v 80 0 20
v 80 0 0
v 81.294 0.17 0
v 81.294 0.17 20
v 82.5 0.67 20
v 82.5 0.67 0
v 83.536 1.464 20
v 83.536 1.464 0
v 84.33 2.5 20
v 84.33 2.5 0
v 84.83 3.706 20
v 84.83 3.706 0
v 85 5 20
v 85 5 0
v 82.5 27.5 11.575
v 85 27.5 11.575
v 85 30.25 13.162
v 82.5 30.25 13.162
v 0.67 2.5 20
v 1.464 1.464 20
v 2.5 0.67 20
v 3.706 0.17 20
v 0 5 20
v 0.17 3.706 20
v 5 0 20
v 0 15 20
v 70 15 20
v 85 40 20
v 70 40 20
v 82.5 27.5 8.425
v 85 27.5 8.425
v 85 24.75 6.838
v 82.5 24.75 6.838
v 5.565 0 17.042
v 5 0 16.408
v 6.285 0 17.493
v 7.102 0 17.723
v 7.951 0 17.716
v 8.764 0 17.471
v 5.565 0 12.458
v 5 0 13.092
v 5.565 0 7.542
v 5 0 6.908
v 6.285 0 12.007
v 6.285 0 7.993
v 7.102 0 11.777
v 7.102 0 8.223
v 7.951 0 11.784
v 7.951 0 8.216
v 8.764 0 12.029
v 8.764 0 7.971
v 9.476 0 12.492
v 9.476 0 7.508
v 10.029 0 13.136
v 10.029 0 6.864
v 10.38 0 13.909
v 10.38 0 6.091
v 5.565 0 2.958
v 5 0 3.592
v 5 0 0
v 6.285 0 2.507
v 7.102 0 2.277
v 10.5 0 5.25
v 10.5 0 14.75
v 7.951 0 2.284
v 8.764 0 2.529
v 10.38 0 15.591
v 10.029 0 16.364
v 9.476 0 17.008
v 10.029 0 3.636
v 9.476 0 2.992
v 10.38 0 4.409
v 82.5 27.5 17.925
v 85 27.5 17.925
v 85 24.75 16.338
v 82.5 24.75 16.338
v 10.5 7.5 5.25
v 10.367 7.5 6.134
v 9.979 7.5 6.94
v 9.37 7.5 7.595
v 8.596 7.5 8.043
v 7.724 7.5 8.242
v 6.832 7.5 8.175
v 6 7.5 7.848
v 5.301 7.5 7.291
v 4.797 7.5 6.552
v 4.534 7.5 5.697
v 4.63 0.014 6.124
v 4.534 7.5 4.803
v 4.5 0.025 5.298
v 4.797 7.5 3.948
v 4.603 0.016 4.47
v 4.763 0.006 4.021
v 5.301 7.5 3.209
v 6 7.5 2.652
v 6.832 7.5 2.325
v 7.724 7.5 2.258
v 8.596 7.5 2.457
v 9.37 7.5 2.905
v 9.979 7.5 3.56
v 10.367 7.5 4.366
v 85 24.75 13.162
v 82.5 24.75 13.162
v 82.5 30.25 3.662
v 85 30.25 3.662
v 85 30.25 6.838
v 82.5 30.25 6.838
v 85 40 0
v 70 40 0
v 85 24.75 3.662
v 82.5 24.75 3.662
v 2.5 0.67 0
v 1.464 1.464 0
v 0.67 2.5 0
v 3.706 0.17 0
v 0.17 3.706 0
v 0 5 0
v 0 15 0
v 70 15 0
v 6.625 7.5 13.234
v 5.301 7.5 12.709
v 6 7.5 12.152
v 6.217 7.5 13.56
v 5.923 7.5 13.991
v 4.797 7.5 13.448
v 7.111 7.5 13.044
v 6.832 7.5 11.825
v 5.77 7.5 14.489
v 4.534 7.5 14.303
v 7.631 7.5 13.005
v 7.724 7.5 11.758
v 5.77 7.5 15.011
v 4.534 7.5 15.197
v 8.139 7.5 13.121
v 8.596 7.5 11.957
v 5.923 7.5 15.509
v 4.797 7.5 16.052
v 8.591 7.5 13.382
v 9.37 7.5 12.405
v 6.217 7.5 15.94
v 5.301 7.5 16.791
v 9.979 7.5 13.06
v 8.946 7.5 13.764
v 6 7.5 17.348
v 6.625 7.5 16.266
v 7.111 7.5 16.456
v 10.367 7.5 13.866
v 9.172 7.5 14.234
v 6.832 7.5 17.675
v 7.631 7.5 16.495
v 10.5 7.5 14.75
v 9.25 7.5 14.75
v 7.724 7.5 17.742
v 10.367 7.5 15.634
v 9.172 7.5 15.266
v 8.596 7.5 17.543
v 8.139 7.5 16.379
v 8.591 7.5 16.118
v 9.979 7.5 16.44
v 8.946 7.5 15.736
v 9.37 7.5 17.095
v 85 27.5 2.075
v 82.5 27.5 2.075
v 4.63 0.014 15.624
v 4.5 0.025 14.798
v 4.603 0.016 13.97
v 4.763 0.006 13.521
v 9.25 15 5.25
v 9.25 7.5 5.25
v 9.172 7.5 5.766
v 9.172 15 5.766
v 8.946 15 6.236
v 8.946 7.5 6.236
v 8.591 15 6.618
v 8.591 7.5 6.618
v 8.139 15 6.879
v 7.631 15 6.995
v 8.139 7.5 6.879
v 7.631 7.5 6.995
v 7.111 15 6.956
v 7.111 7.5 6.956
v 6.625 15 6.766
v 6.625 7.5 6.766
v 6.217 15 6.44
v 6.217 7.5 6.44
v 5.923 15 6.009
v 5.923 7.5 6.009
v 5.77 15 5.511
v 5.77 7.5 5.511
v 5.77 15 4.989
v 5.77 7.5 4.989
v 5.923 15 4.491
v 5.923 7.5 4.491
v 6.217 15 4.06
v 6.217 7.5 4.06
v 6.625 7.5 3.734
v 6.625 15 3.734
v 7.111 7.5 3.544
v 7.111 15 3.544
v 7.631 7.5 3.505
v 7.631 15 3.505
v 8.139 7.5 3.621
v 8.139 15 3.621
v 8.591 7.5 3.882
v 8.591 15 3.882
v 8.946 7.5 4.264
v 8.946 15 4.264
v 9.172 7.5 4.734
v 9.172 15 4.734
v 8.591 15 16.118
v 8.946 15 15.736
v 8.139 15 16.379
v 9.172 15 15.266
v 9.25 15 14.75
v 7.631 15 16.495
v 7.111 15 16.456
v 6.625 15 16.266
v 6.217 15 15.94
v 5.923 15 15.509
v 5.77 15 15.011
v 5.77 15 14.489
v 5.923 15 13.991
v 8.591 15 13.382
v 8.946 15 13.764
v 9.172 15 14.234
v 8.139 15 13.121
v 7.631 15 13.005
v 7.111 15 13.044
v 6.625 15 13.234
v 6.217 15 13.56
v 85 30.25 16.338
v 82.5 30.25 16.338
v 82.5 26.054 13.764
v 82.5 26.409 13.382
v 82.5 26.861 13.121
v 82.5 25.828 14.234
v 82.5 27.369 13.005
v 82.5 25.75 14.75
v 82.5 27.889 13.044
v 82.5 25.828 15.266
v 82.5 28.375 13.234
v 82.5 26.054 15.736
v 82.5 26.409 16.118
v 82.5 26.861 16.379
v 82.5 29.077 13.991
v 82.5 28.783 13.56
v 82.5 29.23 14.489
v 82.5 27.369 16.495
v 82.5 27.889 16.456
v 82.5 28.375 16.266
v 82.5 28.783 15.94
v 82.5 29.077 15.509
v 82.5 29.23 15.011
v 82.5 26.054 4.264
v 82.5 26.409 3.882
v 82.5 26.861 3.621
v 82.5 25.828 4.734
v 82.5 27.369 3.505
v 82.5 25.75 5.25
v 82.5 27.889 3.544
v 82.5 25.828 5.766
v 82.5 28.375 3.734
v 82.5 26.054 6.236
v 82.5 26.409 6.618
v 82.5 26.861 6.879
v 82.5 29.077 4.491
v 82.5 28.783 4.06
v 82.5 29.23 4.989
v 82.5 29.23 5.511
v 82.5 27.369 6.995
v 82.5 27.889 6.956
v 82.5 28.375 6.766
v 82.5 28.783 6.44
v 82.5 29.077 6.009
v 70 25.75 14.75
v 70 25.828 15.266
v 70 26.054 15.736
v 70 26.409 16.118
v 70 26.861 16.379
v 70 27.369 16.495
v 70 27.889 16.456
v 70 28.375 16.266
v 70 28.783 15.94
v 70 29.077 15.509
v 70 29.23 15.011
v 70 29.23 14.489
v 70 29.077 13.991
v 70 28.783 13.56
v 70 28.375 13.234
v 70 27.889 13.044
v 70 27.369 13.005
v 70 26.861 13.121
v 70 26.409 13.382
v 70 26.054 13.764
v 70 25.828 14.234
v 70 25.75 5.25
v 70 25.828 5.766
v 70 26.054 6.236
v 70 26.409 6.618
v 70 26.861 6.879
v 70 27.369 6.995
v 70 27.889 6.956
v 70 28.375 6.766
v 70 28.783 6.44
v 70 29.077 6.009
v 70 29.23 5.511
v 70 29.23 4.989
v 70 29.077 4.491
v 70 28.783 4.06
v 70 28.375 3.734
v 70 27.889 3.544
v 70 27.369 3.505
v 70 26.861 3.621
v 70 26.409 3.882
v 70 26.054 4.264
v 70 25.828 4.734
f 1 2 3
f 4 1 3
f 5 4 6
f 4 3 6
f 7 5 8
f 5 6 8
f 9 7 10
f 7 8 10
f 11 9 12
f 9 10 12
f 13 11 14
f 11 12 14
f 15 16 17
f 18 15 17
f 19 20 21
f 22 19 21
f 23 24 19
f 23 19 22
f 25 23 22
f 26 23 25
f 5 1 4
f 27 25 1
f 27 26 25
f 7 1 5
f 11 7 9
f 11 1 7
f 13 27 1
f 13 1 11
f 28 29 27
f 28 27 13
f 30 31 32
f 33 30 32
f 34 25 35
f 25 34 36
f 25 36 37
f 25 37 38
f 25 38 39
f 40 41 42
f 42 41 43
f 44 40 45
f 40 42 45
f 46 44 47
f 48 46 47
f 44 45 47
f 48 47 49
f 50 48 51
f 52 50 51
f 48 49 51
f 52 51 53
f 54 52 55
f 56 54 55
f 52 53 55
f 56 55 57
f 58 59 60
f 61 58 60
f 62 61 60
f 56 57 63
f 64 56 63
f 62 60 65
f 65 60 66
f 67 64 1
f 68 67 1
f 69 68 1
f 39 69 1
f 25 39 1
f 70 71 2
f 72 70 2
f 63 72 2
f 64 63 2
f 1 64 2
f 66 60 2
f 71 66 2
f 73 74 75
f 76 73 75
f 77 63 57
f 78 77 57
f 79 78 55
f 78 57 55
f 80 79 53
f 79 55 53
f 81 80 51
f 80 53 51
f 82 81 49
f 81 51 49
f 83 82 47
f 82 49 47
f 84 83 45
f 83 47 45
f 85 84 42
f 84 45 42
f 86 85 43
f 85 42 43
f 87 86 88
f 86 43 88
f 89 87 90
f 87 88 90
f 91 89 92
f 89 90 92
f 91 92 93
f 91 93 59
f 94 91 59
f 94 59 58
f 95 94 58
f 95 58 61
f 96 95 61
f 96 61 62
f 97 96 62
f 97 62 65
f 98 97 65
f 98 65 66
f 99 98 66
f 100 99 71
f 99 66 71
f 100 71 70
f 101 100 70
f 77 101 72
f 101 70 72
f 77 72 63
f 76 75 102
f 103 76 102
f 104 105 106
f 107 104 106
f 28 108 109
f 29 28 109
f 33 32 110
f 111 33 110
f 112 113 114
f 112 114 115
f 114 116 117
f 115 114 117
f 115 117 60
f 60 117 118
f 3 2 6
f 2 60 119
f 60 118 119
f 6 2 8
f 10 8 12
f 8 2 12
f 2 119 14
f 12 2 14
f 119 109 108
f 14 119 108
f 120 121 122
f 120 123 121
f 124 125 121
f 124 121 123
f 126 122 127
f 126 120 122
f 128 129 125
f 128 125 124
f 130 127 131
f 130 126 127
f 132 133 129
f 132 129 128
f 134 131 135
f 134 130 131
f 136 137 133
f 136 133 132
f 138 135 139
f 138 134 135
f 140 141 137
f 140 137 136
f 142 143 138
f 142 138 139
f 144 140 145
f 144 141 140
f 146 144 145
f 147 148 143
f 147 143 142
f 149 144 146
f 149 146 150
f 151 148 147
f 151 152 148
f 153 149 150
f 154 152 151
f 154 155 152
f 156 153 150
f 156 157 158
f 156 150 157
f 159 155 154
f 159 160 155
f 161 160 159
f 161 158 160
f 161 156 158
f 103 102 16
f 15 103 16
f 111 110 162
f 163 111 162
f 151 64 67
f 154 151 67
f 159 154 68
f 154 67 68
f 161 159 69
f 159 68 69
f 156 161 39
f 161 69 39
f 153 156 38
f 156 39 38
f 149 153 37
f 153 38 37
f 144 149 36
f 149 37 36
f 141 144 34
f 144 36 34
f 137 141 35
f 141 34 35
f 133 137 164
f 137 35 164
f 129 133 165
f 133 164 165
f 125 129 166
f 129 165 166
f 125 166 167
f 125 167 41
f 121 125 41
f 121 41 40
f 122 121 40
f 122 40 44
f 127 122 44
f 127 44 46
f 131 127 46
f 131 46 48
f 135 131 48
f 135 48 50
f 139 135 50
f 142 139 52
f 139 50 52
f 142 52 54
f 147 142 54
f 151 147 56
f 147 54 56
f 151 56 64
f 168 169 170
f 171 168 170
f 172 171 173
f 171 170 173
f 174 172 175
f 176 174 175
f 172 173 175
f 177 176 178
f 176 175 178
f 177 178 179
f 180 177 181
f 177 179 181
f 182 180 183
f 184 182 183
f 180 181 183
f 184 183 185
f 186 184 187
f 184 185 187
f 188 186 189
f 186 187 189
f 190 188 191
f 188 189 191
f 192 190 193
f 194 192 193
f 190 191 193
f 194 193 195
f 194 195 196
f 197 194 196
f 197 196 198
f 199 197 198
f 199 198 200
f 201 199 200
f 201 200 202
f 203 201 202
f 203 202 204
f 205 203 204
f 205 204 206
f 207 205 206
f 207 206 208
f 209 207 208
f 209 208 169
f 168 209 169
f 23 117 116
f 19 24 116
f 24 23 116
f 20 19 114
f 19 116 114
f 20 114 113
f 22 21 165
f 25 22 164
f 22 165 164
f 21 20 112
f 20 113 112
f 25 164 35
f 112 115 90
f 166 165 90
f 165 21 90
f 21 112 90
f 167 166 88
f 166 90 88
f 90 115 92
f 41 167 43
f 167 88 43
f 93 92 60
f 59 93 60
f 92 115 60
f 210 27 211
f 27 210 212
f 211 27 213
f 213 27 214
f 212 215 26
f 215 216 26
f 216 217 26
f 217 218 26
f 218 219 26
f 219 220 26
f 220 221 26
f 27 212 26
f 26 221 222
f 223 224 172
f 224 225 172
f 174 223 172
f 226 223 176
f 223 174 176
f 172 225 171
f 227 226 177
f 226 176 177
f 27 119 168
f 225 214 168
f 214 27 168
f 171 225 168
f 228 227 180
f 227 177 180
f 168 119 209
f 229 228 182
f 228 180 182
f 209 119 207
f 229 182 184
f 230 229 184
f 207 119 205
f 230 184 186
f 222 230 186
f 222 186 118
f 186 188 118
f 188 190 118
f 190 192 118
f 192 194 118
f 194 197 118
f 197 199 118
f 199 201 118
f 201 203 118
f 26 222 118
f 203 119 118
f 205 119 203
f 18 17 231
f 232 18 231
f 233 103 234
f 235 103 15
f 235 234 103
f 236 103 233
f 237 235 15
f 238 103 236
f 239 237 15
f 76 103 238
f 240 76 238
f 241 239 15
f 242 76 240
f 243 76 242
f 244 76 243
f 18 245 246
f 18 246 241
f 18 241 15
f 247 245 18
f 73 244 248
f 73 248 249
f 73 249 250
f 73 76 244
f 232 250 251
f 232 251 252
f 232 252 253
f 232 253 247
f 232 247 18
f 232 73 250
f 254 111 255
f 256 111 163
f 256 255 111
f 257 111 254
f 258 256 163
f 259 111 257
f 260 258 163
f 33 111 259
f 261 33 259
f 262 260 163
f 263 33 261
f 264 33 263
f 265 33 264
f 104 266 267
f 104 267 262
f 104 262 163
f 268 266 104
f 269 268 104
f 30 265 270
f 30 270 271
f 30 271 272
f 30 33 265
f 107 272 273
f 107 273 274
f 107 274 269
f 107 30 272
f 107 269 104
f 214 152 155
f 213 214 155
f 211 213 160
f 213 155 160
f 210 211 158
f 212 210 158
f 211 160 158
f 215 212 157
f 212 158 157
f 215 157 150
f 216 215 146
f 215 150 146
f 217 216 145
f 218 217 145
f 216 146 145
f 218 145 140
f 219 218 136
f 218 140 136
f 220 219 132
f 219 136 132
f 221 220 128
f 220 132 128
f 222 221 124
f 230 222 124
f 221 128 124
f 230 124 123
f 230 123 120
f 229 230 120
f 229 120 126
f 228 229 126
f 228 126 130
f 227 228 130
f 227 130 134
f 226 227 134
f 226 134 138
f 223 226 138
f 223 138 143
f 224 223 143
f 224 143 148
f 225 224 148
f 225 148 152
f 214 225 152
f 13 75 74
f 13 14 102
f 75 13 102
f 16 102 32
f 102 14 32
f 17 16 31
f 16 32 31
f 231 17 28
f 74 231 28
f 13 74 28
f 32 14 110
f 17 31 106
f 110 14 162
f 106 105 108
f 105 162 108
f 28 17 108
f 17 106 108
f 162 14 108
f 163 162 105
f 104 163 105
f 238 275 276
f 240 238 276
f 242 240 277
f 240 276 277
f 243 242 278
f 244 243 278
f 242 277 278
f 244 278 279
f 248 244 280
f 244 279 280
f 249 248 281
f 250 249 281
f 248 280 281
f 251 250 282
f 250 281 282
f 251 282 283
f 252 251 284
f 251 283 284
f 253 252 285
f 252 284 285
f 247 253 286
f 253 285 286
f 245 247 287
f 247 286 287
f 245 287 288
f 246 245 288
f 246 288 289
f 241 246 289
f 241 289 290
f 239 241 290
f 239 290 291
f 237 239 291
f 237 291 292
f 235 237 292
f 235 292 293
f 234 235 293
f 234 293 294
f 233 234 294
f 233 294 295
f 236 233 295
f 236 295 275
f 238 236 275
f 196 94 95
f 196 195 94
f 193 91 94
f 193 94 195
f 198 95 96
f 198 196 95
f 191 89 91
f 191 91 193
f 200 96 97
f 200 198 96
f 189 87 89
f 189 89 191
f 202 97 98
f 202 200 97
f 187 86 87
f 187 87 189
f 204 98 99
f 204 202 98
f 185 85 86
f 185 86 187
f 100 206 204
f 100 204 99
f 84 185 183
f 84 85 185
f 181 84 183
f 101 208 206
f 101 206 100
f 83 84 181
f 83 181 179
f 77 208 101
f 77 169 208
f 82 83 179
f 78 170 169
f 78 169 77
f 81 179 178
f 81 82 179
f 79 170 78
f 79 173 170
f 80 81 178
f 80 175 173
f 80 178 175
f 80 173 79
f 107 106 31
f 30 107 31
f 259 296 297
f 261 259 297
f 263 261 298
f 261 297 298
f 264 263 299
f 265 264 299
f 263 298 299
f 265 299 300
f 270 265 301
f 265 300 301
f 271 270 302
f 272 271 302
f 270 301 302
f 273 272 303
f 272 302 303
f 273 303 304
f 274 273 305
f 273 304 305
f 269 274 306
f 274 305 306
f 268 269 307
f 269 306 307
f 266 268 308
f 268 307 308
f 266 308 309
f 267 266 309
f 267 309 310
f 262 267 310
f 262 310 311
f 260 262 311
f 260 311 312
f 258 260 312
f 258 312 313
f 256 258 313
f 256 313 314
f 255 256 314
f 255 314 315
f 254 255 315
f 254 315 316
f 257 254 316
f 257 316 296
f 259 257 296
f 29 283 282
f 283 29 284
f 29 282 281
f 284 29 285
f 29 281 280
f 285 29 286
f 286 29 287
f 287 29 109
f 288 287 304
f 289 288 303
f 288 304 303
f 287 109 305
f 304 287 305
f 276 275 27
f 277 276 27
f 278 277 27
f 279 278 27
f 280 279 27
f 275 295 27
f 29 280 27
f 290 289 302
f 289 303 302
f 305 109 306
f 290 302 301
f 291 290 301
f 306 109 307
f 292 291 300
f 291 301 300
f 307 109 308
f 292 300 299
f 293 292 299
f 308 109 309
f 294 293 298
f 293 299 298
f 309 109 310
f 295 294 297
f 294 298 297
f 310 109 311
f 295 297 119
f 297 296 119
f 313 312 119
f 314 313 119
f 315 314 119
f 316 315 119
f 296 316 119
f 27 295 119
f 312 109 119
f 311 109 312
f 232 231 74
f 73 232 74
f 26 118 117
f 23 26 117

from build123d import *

# Parameters (mm, degrees)
F1_DEPTH    = 20
F2_R        = 1.75
F3_DEPTH    = 40.001
F4_R        = 3
F5_DEPTH    = 7.5
F6_R        = 1.75
F7_DEPTH    = 15.001
F8_T1_DEPTH = 45
F10_DEPTH   = 2.5


# Not quite as in the source:
# - a fillet or chamfer that OpenCascade refuses, or shapes differently, is made with other operations: its cross-section is extruded or revolved along the edge and cut away or added


with BuildPart() as f1:
    # F0 (on Top) → F1 (new body)
    with BuildSketch(Plane.XY):
        Polygon((0, 15), (0, 0), (85, 0), (85, 40), (70, 40), (70, 15), align=None)
    extrude(amount=F1_DEPTH)

    # F2 (on face) → F3 (cut, through all)
    with BuildSketch(Plane.XZ):
        with Locations((7.5, 14.75)):
            Circle(F2_R)
        with Locations((7.5, 5.25)):
            Circle(F2_R)
    extrude(amount=-F3_DEPTH, mode=Mode.SUBTRACT)

    # F4 (on face) → F5 (cut)
    with BuildSketch(Plane.XZ):
        with Locations((7.5, 14.75)):
            Circle(F4_R)
        with Locations((7.5, 5.25)):
            Circle(F4_R)
    extrude(amount=-F5_DEPTH, mode=Mode.SUBTRACT)

    # F6 (on face) → F7 (cut, through all)
    with BuildSketch(Plane(origin=(70, 0, 0), x_dir=(0, -1, 0), z_dir=(-1, 0, 0))):
        with Locations((-27.5, 14.75)):
            Circle(F6_R)
        with Locations((-27.5, 5.25)):
            Circle(F6_R)
    extrude(amount=-F7_DEPTH, mode=Mode.SUBTRACT)

    # F8: fillet of radius 5 on 2 edges, made by hand

    # F8_s2 → F8_t1 (cut)
    with BuildSketch(Plane.XY.offset(-12.5)):
        with BuildLine():
            ThreePointArc((80, 0), (83.5355339059, 1.4644660941), (85, 5))
            Line((85, 5), (85, 0))
            Line((85, 0), (80, 0))
        make_face()
        with BuildLine():
            ThreePointArc((0, 5), (1.4644660941, 1.4644660941), (5, 0))
            Line((5, 0), (0, 0))
            Line((0, 0), (0, 5))
        make_face()
    extrude(amount=F8_T1_DEPTH, mode=Mode.SUBTRACT)

    # F9 (on face) → F10 (cut)
    with BuildSketch(Plane.YZ.offset(85)):
        Polygon((27.5, 11.5745735195), (30.25, 13.1622867597), (30.25, 16.3377132403), (27.5, 17.9254264805), (24.75, 16.3377132403), (24.75, 13.1622867597), align=None)
        Polygon((30.25, 6.8377132403), (27.5, 8.4254264805), (24.75, 6.8377132403), (24.75, 3.6622867597), (27.5, 2.0745735195), (30.25, 3.6622867597), align=None)
    extrude(amount=-F10_DEPTH, mode=Mode.SUBTRACT)


solid = f1.part
